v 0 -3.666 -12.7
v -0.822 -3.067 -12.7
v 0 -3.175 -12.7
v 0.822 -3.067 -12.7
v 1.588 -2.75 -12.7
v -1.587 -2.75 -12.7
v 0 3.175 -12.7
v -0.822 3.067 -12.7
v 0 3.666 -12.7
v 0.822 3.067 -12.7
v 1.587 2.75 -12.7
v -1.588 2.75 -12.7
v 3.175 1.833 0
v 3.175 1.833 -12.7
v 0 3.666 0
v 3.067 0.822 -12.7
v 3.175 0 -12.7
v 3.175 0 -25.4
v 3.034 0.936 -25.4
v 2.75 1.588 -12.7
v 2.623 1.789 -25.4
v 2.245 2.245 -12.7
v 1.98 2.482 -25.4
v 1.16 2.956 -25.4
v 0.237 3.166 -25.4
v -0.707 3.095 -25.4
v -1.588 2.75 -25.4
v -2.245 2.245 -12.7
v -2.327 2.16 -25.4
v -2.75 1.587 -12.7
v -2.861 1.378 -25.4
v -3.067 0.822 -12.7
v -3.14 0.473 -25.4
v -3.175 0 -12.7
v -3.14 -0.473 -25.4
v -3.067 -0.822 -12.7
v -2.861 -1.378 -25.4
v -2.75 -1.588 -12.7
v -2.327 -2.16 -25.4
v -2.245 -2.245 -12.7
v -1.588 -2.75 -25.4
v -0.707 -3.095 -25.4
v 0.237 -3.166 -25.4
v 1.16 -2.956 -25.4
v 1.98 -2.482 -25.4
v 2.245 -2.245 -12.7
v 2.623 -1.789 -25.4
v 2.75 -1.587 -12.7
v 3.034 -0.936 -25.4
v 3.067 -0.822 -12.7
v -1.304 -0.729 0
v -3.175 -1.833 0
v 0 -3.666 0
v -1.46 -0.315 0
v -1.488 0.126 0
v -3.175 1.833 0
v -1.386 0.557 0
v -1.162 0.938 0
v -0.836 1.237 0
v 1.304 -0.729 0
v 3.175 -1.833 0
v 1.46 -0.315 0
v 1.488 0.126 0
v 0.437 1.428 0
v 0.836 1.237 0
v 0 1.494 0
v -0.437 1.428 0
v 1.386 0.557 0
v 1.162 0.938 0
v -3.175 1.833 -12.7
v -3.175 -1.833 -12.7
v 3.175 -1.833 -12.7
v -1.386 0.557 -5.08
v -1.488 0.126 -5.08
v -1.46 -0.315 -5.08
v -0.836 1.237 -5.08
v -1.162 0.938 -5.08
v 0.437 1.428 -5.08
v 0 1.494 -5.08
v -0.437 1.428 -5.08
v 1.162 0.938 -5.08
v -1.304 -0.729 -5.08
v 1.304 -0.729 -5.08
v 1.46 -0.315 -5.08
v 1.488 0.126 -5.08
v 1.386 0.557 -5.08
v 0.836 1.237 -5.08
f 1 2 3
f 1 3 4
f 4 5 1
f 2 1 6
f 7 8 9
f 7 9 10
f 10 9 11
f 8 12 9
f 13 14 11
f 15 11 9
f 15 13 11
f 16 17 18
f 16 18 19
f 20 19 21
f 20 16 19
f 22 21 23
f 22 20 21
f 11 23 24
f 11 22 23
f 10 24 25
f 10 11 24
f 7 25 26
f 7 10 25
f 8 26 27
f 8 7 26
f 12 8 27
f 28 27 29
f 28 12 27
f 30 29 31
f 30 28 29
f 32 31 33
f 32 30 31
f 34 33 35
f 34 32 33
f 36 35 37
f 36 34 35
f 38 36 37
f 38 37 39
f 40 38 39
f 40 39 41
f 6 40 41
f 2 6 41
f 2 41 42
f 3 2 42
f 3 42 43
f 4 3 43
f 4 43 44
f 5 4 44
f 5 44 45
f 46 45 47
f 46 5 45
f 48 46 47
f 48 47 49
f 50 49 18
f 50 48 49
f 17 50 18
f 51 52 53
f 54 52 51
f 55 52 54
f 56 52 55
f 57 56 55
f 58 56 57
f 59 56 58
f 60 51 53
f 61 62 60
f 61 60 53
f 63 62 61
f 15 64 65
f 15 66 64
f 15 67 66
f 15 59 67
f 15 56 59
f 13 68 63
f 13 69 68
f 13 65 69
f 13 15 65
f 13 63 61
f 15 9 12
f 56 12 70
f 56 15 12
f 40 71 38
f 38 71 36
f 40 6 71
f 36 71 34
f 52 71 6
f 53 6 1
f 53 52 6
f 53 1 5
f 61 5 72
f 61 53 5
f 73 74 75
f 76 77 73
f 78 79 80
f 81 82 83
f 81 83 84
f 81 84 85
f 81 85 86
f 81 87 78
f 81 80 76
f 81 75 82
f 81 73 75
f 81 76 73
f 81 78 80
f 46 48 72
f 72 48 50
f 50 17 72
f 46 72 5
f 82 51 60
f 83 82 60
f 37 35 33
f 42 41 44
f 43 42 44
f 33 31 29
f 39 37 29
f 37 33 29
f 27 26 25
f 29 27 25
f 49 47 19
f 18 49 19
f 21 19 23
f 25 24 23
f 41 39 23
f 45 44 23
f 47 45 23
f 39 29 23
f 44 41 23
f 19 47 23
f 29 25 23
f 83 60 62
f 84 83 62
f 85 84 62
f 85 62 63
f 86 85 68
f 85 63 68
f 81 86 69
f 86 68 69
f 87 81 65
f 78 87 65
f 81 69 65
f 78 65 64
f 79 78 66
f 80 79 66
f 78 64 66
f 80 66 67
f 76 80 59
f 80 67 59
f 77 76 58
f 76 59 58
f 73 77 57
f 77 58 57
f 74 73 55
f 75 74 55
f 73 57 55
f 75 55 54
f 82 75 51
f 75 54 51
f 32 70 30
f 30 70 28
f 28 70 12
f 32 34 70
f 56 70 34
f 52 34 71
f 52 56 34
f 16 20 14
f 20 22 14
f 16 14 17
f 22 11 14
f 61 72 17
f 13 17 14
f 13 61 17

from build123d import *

# Parameters (mm, degrees)
BOSS_EXTRUDE1_DEPTH = 25.4
CUT_EXTRUDE1_DEPTH  = 5.08
SKETCH3_OUTSIDE_W   = 13.788
SKETCH3_OUTSIDE_H   = 14.77
SKETCH3_OUTSIDE_R   = 3.175
CUT_EXTRUDE2_DEPTH  = 13.7


with BuildPart() as part:
    # Sketch1 → Boss-Extrude1 (new body)
    with BuildSketch(Plane.XY):
        Polygon((0, 3.666174209), (-3.175, 1.833087105), (-3.175, -1.833087105), (0, -3.666174209), (3.175, -1.833087105), (3.175, 1.833087105), align=None)
    extrude(amount=-BOSS_EXTRUDE1_DEPTH)

    # Sketch2 → Cut-Extrude1 (cut)
    with BuildSketch(Plane.XY):
        with BuildLine():
            Line((-1.303529881, -0.72898), (1.303529881, -0.72898))
            ThreePointArc((1.303529881, -0.72898), (0, 1.49352), (-1.303529881, -0.72898))
        make_face()
    extrude(amount=-CUT_EXTRUDE1_DEPTH, mode=Mode.SUBTRACT)

    # Sketch3 outside → Cut-Extrude2 (cut, through all)
    with BuildSketch(Plane.XY.offset(-12.7)):
        Rectangle(SKETCH3_OUTSIDE_W, SKETCH3_OUTSIDE_H)
        Circle(SKETCH3_OUTSIDE_R, mode=Mode.SUBTRACT)
    extrude(amount=-CUT_EXTRUDE2_DEPTH, mode=Mode.SUBTRACT)


solid = part.part
